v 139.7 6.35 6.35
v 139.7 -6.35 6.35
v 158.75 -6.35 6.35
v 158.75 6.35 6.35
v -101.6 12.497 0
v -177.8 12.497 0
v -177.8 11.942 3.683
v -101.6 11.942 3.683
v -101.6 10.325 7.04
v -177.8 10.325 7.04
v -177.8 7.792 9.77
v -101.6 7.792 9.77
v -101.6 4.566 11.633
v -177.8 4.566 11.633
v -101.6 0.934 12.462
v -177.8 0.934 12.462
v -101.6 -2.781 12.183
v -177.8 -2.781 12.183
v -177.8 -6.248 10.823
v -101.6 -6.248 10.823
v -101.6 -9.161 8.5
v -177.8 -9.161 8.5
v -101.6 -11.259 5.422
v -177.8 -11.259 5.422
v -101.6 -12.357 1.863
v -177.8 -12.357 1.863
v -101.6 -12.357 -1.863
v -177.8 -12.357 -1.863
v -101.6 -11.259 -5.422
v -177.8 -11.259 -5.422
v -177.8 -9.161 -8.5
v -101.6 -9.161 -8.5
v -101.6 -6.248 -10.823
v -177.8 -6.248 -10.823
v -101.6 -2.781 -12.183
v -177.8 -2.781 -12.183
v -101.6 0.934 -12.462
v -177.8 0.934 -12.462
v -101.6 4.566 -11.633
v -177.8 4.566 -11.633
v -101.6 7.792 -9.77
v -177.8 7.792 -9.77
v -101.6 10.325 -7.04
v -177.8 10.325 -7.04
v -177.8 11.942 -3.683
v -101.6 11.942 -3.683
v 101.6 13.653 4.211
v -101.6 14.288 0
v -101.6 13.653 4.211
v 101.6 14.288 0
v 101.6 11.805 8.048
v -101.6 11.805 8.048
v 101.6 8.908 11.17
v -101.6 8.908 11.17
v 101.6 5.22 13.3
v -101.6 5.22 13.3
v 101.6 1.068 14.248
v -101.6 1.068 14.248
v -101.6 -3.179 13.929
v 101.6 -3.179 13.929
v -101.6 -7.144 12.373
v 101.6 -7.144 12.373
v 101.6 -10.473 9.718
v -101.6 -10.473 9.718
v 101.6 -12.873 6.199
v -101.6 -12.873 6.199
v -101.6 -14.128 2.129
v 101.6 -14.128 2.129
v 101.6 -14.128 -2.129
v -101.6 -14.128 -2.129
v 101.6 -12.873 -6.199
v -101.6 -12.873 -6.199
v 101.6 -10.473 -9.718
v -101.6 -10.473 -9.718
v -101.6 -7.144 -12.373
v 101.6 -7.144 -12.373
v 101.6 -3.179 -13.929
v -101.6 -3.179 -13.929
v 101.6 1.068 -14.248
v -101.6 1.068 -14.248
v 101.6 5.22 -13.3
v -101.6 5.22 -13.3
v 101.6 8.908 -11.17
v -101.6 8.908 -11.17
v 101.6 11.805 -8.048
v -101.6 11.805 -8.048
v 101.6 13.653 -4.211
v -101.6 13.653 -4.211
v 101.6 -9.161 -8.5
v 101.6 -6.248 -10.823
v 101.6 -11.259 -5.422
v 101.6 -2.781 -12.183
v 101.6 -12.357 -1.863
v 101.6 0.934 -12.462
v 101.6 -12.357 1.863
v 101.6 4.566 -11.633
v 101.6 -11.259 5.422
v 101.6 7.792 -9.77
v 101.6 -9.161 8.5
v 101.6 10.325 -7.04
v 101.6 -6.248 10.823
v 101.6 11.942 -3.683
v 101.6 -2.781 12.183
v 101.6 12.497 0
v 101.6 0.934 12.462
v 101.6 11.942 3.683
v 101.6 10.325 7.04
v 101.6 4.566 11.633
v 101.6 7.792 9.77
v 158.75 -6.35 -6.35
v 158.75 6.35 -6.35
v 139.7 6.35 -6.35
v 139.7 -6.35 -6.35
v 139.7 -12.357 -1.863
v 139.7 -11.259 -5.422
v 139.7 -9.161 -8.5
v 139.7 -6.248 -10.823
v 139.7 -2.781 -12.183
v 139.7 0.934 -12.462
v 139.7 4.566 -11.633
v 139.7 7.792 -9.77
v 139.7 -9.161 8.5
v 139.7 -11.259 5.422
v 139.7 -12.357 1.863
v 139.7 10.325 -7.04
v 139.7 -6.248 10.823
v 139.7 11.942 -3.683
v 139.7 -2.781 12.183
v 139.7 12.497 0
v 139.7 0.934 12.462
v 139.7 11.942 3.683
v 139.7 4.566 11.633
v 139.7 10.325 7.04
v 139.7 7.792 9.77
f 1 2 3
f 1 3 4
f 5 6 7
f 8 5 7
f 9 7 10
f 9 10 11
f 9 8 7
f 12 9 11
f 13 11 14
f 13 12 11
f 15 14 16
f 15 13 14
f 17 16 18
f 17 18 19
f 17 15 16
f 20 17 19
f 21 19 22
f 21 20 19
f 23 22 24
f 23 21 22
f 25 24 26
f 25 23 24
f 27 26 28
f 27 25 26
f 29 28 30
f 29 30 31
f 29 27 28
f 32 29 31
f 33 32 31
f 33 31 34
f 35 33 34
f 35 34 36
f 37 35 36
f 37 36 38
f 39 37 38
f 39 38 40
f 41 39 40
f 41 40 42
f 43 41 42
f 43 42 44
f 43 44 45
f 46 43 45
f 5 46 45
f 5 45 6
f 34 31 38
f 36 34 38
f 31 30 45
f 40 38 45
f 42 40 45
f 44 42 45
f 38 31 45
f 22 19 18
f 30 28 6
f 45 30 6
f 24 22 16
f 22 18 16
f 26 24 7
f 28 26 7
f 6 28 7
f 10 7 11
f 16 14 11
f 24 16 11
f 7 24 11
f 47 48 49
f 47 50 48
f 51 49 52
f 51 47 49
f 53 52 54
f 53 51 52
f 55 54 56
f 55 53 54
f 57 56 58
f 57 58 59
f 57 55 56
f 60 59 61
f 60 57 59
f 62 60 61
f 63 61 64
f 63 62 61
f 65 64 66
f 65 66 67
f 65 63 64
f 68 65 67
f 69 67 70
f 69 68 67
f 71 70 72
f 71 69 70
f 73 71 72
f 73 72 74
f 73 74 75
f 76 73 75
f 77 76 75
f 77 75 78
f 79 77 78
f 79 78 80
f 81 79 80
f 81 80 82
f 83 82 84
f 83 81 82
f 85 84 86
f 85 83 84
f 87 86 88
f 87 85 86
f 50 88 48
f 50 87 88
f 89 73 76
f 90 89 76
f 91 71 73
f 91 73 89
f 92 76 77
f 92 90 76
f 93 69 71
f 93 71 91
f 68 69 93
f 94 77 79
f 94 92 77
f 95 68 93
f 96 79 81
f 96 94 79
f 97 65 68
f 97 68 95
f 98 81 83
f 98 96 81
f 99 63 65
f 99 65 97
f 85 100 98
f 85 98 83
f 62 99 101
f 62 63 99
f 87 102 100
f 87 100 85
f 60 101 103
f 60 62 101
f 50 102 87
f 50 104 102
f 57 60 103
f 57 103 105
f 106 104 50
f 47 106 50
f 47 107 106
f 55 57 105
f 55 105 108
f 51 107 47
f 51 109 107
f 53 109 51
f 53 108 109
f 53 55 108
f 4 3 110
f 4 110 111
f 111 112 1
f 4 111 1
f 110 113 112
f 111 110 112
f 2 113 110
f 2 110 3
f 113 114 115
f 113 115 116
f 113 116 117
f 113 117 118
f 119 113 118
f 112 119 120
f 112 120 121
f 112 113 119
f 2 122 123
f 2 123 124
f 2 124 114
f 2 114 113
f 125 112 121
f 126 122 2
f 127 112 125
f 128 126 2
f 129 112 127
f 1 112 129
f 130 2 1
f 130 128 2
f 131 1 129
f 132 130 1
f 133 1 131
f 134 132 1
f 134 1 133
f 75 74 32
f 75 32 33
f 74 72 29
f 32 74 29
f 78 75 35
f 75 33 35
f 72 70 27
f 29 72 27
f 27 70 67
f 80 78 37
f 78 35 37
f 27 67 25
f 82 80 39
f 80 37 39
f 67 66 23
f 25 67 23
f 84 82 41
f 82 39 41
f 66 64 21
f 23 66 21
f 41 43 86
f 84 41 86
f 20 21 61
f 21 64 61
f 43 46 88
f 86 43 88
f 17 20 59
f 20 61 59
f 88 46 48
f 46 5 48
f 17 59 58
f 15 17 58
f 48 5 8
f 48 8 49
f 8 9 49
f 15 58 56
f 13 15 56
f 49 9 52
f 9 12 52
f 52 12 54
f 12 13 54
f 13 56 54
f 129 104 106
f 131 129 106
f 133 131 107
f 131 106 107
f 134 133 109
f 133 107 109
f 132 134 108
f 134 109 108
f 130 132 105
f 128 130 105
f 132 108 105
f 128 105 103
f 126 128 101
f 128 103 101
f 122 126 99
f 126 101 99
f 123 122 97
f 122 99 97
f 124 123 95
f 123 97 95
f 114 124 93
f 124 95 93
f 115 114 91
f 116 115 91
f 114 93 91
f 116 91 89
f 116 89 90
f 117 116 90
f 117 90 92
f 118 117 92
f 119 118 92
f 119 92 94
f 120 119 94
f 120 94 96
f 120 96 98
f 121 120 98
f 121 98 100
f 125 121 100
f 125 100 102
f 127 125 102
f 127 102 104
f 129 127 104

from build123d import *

# Parameters (mm, degrees)
F0_R          = 14.2875
F0_R_2        = 12.4968
F1_DEPTH      = 101.6
F1_DEPTH_BACK = 101.6
F0_W          = 12.7
F0_H          = 12.7
F2_DEPTH      = 139.7
F2_DEPTH_BACK = 177.8
F3_DEPTH      = 158.75
F3_DEPTH_BACK = 177.8


with BuildPart() as f1:
    # F0 (on Right) → F1 (new body, two sides)
    with BuildSketch(Plane.YZ) as f1_sk:
        Circle(F0_R)
        Circle(F0_R_2, mode=Mode.SUBTRACT)
    extrude(amount=F1_DEPTH)
    extrude(f1_sk.sketch, amount=-F1_DEPTH_BACK)

    # F0 (on Right) → F2 (join, two sides)
    with BuildSketch(Plane.YZ) as f2_sk:
        Circle(F0_R_2)
        Rectangle(F0_W, F0_H, mode=Mode.SUBTRACT)
    extrude(amount=F2_DEPTH)
    extrude(f2_sk.sketch, amount=-F2_DEPTH_BACK)

    # F0 (on Right) → F3 (join, two sides)
    with BuildSketch(Plane.YZ) as f3_sk:
        Rectangle(F0_W, F0_H)
    extrude(amount=F3_DEPTH)
    extrude(f3_sk.sketch, amount=-F3_DEPTH_BACK)


solid = f1.part
